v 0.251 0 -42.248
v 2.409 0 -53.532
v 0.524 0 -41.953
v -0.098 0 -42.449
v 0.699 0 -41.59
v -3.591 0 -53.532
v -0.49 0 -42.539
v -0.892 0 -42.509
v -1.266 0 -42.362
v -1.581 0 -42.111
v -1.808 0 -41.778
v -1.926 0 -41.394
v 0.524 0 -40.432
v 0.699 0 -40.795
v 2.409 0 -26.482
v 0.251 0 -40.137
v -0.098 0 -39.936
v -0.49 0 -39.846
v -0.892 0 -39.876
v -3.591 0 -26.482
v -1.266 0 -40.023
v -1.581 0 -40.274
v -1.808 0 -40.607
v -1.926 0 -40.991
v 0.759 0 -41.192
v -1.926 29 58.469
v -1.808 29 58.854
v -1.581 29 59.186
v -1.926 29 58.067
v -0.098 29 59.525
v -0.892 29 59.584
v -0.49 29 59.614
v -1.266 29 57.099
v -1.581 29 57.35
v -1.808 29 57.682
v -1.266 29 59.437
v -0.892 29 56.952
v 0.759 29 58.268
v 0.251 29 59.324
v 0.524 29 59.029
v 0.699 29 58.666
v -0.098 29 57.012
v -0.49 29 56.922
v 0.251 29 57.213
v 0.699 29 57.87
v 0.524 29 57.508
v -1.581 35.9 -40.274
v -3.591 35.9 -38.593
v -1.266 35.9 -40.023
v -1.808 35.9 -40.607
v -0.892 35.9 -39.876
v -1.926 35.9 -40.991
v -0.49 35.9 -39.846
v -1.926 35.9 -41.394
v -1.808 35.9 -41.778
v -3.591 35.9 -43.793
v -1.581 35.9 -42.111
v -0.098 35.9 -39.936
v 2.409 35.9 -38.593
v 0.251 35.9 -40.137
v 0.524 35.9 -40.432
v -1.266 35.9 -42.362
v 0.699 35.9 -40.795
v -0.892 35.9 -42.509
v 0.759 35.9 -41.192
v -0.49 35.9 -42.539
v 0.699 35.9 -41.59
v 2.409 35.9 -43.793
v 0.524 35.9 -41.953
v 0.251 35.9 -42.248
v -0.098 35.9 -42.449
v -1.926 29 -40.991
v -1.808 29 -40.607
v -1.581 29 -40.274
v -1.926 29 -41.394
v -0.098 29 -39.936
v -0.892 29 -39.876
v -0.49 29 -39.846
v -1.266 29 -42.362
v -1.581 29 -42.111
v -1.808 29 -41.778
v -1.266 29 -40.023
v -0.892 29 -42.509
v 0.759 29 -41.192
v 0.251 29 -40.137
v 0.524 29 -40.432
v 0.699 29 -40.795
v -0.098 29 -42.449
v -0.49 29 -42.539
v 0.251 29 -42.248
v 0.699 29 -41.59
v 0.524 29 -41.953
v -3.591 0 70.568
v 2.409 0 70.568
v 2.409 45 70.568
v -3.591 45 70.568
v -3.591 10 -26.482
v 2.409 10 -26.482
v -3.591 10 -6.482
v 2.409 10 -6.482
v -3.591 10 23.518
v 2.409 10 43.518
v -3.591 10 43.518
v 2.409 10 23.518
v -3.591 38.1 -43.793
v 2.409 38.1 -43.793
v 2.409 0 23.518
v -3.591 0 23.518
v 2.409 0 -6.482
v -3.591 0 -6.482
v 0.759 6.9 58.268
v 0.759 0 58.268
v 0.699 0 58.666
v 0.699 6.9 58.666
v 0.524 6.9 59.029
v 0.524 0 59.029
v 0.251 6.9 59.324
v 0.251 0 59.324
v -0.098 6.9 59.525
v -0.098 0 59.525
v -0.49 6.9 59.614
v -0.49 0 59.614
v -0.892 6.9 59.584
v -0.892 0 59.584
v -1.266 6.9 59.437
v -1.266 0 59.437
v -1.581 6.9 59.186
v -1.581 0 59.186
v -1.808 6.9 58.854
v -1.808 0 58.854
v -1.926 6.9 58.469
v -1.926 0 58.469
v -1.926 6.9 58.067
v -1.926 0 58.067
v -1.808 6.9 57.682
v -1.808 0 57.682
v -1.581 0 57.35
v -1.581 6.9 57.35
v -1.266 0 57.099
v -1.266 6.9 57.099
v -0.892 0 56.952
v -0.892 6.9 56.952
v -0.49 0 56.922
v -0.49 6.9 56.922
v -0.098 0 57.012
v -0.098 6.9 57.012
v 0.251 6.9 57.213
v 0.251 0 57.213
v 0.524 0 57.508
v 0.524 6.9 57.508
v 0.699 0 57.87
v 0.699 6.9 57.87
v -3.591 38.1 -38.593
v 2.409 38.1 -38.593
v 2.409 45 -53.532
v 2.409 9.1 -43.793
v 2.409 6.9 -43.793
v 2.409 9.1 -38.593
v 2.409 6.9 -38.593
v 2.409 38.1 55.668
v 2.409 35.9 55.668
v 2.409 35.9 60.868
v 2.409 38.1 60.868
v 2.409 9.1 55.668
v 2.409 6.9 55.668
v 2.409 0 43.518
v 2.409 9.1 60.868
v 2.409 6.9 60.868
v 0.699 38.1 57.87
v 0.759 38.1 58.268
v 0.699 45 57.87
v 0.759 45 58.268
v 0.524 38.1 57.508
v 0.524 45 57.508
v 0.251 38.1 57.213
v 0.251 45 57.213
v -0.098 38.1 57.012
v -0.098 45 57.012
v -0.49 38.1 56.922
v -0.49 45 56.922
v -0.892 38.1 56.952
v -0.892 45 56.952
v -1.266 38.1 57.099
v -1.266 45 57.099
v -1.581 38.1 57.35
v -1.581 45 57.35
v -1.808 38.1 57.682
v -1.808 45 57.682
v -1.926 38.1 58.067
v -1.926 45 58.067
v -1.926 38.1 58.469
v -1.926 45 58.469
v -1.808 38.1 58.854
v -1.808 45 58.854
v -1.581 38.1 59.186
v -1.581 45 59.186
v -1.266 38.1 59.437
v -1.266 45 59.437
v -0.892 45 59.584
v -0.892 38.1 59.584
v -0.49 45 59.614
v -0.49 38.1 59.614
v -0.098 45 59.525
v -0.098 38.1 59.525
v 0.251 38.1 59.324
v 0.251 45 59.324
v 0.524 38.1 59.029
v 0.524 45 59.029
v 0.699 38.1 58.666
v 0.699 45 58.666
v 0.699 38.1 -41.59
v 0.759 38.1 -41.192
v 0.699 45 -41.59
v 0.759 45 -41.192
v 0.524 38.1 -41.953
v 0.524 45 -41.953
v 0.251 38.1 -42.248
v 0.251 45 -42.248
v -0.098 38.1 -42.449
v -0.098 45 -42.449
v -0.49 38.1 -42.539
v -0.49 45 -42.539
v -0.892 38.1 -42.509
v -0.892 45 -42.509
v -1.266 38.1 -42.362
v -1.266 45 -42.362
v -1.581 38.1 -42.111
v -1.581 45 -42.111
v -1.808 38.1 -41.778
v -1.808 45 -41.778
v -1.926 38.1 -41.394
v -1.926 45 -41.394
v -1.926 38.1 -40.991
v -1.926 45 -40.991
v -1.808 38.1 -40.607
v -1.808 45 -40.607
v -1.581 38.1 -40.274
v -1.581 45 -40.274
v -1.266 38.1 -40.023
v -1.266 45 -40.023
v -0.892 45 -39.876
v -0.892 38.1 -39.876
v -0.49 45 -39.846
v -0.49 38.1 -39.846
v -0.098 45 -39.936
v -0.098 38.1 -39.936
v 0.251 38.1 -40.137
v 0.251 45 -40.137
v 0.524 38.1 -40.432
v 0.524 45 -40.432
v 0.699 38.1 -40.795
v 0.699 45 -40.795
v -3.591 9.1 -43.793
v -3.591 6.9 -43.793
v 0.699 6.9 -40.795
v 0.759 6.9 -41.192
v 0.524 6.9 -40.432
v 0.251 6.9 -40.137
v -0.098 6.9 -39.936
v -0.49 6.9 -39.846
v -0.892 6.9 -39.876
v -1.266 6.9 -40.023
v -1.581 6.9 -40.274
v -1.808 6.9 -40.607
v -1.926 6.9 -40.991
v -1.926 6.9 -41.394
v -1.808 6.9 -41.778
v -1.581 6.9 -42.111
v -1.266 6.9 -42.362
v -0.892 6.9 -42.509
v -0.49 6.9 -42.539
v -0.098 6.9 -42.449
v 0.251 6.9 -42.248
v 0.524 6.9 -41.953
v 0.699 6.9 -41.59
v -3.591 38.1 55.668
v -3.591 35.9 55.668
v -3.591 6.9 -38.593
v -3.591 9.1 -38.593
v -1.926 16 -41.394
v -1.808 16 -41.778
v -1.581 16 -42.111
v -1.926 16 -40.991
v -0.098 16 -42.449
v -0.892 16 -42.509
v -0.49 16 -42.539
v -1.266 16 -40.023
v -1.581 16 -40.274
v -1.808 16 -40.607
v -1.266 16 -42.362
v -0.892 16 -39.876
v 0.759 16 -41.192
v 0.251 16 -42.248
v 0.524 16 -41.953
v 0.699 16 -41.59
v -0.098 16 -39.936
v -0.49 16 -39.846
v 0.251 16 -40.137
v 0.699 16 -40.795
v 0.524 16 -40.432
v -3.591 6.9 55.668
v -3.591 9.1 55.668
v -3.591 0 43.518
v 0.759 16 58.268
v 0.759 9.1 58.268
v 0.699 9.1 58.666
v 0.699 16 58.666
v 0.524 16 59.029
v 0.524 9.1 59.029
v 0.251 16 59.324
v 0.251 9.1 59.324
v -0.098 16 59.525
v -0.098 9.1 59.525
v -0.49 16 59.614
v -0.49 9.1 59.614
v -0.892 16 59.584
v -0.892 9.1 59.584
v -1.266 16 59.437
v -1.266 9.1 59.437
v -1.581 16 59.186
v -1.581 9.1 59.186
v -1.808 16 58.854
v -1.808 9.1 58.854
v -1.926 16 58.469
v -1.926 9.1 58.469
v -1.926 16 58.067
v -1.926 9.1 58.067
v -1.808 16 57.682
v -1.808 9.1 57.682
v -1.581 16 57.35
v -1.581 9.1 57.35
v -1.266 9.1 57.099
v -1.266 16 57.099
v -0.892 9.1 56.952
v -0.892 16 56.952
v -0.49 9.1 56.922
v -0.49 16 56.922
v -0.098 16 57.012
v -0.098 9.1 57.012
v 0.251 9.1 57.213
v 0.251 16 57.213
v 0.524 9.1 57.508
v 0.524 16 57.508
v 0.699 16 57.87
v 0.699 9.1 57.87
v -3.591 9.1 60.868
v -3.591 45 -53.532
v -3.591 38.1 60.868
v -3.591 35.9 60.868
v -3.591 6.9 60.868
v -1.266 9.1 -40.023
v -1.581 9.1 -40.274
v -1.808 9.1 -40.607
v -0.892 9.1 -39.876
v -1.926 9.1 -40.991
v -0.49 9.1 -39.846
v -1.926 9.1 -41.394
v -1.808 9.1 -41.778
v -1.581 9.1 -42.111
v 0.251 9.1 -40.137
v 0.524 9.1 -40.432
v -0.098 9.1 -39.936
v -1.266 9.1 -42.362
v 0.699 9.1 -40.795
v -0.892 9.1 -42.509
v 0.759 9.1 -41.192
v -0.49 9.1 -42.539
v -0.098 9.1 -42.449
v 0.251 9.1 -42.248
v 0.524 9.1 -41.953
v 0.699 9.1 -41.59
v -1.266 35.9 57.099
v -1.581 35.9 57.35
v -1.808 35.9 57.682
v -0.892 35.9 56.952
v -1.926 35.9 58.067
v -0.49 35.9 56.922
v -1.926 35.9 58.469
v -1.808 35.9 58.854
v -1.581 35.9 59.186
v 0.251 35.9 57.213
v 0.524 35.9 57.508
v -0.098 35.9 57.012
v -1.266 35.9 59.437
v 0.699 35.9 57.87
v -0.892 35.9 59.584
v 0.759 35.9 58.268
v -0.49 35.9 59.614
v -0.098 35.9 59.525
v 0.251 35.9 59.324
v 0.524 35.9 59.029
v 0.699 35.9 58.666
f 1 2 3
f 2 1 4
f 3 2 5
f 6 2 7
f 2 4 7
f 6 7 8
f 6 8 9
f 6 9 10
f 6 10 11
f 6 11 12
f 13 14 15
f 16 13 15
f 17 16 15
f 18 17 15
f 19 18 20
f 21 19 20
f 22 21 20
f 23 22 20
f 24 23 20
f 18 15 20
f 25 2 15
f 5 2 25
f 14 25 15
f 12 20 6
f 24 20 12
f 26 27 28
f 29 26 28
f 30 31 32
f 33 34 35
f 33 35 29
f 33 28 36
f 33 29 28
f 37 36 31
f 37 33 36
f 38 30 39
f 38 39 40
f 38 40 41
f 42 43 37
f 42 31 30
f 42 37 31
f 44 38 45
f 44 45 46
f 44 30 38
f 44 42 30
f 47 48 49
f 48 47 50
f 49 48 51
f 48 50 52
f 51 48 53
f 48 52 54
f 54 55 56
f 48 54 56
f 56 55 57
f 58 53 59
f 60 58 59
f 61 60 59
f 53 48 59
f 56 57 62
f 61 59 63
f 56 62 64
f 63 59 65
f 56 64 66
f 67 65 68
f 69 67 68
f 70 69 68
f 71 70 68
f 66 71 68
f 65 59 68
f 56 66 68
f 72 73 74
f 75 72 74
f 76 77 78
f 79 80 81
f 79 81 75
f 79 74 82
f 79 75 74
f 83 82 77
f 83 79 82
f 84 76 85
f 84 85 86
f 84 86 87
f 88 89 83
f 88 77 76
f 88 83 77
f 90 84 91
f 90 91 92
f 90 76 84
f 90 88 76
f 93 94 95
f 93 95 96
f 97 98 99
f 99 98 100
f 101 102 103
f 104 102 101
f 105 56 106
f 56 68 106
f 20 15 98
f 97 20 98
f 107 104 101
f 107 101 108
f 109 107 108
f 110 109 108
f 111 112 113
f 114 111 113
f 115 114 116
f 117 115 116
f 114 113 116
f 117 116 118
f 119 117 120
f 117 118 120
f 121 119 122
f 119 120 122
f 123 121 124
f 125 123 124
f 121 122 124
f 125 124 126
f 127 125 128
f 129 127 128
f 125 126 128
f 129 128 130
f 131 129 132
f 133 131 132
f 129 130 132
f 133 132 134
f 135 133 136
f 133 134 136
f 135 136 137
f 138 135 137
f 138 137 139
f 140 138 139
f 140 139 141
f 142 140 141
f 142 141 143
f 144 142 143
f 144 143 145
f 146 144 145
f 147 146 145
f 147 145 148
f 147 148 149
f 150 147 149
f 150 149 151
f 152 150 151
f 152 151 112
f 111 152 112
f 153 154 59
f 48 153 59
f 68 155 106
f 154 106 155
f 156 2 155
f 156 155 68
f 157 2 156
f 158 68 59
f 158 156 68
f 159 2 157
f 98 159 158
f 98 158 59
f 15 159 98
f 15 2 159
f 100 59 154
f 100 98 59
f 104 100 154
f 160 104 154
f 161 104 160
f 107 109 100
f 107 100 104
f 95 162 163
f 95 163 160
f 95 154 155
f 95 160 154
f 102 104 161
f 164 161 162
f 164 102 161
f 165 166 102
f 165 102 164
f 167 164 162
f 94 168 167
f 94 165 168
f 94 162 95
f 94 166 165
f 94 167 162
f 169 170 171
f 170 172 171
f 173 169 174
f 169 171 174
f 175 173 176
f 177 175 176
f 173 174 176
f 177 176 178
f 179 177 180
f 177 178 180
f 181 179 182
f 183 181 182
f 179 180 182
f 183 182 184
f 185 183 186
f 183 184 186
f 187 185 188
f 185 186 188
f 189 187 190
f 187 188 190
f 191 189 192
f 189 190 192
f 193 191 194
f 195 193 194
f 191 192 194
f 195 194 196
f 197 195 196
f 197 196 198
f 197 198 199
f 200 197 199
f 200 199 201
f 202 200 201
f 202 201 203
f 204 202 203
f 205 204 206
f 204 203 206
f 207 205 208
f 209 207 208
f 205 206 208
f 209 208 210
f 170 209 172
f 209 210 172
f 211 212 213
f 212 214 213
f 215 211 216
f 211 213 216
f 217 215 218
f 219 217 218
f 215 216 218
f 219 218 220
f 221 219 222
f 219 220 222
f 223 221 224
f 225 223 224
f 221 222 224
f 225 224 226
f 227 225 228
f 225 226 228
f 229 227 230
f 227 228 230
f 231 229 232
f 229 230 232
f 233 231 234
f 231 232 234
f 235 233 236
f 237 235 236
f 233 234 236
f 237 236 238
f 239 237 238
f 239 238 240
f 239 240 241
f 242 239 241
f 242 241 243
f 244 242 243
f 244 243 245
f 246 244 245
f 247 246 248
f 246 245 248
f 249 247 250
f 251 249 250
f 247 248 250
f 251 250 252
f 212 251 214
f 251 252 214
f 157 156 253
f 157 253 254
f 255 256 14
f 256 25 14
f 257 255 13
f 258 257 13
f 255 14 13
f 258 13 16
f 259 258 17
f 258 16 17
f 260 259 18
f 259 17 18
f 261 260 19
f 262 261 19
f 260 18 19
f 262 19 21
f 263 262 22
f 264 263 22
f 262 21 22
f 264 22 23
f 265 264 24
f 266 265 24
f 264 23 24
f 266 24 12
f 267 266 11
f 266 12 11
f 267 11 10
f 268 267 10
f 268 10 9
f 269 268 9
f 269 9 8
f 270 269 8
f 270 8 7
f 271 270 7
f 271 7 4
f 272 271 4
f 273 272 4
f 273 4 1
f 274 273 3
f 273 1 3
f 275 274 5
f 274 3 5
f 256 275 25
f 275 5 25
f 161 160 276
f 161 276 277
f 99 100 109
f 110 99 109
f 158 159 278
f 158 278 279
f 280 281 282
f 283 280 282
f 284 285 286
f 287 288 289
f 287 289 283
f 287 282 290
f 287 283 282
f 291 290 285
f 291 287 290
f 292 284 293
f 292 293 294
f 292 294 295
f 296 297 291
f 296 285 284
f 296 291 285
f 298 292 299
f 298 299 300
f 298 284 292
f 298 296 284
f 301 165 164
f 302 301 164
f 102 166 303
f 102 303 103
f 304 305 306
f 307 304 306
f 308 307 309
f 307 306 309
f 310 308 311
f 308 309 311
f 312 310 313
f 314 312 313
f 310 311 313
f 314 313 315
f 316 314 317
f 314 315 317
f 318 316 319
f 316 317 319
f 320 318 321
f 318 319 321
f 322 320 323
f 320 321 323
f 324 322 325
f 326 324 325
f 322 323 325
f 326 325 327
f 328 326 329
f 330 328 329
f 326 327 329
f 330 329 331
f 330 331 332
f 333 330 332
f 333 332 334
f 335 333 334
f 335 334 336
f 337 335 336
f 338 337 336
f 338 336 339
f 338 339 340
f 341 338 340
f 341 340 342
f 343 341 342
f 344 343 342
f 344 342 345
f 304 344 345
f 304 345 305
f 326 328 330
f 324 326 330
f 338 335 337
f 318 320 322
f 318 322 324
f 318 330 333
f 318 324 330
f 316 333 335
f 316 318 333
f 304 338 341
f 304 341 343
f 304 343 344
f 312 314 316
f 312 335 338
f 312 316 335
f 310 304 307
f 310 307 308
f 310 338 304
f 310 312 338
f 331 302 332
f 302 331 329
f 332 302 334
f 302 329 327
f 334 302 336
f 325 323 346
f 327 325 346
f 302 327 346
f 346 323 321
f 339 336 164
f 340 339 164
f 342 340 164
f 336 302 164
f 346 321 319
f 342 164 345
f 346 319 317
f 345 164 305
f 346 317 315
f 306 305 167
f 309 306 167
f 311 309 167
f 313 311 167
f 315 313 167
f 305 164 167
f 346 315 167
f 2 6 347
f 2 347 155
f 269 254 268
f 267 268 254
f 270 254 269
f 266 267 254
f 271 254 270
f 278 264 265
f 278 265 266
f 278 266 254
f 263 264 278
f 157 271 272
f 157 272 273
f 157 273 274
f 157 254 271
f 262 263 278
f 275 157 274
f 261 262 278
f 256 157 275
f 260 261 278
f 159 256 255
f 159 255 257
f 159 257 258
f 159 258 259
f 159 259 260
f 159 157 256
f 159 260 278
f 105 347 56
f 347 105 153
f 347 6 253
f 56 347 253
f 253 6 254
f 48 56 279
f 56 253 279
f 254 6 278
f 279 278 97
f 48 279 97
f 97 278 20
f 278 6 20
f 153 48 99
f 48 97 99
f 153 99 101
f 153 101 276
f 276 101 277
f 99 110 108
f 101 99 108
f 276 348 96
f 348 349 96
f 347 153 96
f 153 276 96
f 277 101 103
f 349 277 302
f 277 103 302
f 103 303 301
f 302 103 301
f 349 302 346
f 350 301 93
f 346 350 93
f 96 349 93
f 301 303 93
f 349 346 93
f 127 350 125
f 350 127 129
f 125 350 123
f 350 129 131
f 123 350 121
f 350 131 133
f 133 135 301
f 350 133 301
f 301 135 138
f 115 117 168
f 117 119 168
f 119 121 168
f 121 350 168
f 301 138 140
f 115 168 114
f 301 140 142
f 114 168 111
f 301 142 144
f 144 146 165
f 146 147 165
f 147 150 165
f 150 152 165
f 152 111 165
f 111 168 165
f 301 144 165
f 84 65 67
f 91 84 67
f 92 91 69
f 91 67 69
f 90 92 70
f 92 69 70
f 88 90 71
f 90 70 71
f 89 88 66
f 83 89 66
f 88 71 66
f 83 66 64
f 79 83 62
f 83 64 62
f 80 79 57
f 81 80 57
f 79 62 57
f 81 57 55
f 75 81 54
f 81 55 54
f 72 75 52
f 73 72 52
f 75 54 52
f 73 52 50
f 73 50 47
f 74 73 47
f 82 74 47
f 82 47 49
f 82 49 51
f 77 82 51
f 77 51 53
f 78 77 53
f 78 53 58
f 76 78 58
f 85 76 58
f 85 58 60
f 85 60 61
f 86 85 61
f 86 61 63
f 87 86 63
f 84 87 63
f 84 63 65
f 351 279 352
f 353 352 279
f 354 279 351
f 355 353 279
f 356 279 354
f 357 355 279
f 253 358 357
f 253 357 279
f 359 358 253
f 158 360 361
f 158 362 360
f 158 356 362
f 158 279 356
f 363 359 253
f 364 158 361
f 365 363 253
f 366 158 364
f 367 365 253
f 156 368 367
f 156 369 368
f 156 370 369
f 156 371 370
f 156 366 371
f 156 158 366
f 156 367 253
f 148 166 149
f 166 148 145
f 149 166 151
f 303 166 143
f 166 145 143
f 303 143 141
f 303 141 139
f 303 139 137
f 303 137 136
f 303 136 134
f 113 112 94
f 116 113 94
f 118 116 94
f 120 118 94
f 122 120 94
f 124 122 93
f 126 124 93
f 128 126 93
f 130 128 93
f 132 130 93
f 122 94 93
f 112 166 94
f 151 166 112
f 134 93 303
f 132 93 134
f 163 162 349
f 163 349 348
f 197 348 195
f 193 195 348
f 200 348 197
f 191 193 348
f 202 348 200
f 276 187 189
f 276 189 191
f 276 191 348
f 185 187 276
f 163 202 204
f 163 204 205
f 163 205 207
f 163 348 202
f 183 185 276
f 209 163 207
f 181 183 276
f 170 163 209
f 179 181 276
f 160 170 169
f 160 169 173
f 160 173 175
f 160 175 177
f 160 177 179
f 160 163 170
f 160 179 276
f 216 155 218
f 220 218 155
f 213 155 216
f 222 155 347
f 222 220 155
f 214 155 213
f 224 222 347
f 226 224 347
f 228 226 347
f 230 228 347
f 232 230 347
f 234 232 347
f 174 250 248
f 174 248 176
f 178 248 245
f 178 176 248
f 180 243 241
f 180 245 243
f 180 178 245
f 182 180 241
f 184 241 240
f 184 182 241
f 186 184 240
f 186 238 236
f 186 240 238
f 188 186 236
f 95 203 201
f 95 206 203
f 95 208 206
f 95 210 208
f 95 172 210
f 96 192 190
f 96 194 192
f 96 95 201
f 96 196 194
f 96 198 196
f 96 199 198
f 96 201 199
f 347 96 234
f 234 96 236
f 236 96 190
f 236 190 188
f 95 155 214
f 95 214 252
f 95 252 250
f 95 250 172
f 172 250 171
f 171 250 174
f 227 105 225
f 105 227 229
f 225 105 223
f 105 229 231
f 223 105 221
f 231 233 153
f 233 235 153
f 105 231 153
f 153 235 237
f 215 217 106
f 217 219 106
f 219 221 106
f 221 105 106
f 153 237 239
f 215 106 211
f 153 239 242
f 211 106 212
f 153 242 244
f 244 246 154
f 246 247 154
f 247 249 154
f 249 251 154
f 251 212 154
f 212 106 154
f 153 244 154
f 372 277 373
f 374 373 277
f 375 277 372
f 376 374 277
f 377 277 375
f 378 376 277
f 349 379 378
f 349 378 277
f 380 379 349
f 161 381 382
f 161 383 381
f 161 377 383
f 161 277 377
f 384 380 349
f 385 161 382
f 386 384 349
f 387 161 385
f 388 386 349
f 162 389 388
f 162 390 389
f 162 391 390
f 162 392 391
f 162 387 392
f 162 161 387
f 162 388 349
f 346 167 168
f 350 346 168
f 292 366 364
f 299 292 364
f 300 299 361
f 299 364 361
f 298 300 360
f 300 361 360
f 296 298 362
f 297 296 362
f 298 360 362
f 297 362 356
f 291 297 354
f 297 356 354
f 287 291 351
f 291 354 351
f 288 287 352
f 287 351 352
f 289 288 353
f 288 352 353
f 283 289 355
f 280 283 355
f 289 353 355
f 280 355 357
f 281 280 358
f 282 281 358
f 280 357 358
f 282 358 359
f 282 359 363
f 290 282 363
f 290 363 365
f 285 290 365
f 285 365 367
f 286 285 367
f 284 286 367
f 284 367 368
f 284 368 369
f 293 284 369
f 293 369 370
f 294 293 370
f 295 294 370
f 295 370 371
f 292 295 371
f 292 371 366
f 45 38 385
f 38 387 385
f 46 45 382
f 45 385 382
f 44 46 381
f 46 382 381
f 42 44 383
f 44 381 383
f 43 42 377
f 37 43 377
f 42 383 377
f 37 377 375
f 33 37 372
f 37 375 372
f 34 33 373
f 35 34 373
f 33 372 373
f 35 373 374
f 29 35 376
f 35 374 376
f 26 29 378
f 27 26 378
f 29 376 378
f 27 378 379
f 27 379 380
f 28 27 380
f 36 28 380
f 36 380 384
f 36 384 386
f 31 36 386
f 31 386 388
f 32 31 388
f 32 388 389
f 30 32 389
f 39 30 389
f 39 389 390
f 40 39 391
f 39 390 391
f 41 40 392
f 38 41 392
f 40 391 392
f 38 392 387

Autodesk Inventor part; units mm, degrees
ref_plane "YZ Plane" through (0, 0, 0) normal (1, 0, 0) x (0, 1, 0)
ref_plane "XZ Plane" through (0, 0, 0) normal (0, 1, 0) x (-1, 0, 0)
ref_plane "XY Plane" through (0, 0, 0) normal (0, 0, 1) x (1, 0, 0)
sketch "스케치1" plane through (0, 0, 0) normal (0, 1, 0) x (-1, 0, 0)
  line L0 (3.5912, -53.5318) -> (3.5912, 70.5682)
  line L1 (3.5912, -53.5318) -> (-2.4088, -53.5318)
  line L2 (-2.4088, -53.5318) -> (-2.4088, 70.5682)
  line L3 (-2.4088, 70.5682) -> (3.5912, 70.5682)
  line L4 (3.5912, 70.5682) -> (3.5912, -53.5318)
  point P0 (0, 0)
  dimension "d0" = 6
extrude "돌출1" add sketch "스케치1" along normal blind 45
sketch "스케치2" plane through (0, 45, 0) normal (0, 1, 0) x (1, 0, 0)
  line L0 (2.4088, -70.5682) -> (2.4088, 53.5318)
  line L1 (2.4088, -70.5682) -> (-3.5912, -70.5682)
  line L2 (-3.5912, -70.5682) -> (-3.5912, 53.5318)
  line L3 (-3.5912, 53.5318) -> (2.4088, 53.5318)
  line L4 (2.4088, 53.5318) -> (2.4088, -70.5682)
  circle A0 centre (-0.5912, -58.2682) radius 1.35
  circle A1 centre (-0.5912, 41.1925) radius 1.35
  line L5 (2.4088, -70.5682) -> (2.4088, 53.5318) projected
  line L6 (2.4088, 53.5318) -> (-3.5912, 53.5318) projected
  line L7 (-3.5912, 53.5318) -> (-3.5912, -70.5682) projected
  line L8 (-3.5912, -70.5682) -> (2.4088, -70.5682) projected
  point P0 (0, 0)
  dimension "d3" = 6
  dimension "d4" = 2.7
  dimension "d5" = 2.7
extrude "돌출2" cut sketch "스케치2" against normal blind 16 contours A0 | A1
sketch "스케치3" plane through (2.4088, 0, 70.5682) normal (1, 0, 0) x (0, 0, -1)
  line L0 (0, 0) -> (124.1, 0) projected
  line L1 (124.1, 0) -> (124.1, 45) projected
  line L2 (0, 45) -> (124.1, 45) projected
  line L3 (0, 0) -> (0, 45) projected
  line L4 (62.05, 0) -> (77.05, 0)
  line L5 (77.05, 0) -> (47.05, 0)
  line L6 (77.05, 0) -> (97.05, 0)
  line L7 (97.05, 0) -> (97.05, 10)
  line L8 (97.05, 10) -> (77.05, 10)
  line L9 (77.05, 10) -> (77.05, 0)
  line L10 (47.05, 0) -> (27.05, 0)
  line L11 (27.05, 0) -> (27.05, 10)
  line L12 (27.05, 10) -> (47.05, 10)
  line L13 (47.05, 10) -> (47.05, 0)
  point P0 (70.5682, 0)
  dimension "d8" = 15
  dimension "d9" = 30
  dimension "d10" = 20
  dimension "d11" = 10
  dimension "d12" = 20
  dimension "d13" = 10
extrude "돌출3" cut sketch "스케치3" against normal blind 16 contours L11 L12 L13 L0 | L9 L8 L7 L0
sketch "스케치4" plane through (0, 0, 0) normal (0, -1, 0) x (1, 0, 0)
  circle A0 centre (-0.5912, 58.2682) radius 1.35 projected
  circle A1 centre (-0.5912, -41.1925) radius 1.35 projected
  point P0 (0, 0)
extrude "돌출4" cut sketch "스케치4" against normal blind 16
sketch "스케치5" plane through (2.4088, 0, -53.5318) normal (1, 0, 0) x (0, 0, -1)
  line L0 (-97.05, 0) -> (-124.1, 0) projected
  line L1 (-124.1, 0) -> (-97.05, 0) projected
  line L2 (-27.05, 0) -> (0, 0) projected
  line L3 (0, 45) -> (-124.1, 45) projected
  line L4 (-124.1, 45) -> (0, 45) projected
  line L5 (-113.15, 45) -> (-110.45, 45) projected
  line L6 (-13.6892, 45) -> (-10.9892, 45) projected
  line L7 (-124.1, 45) -> (0, 45) projected
  line L8 (0, 45) -> (-124.1, 45) projected
  line L9 (-47.05, 10) -> (-47.05, 0) projected
  line L10 (-47.05, 0) -> (-77.05, 0) projected
  line L11 (-77.05, 0) -> (-77.05, 10) projected
  line L12 (-77.05, 10) -> (-97.05, 10) projected
  line L13 (-97.05, 10) -> (-97.05, 0) projected
  line L14 (-97.05, 0) -> (-124.1, 0) projected
  line L15 (-124.1, 0) -> (-124.1, 45) projected
  line L16 (0, 45) -> (-124.1, 45) projected
  line L17 (0, 0) -> (0, 45) projected
  line L18 (0, 0) -> (-27.05, 0) projected
  line L19 (-27.05, 0) -> (-27.05, 10) projected
  line L20 (-27.05, 10) -> (-47.05, 10) projected
  line L21 (-47.05, 0) -> (-47.05, 10) projected
  line L22 (-47.05, 10) -> (-27.05, 10) projected
  line L23 (-27.05, 10) -> (-27.05, 0) projected
  line L24 (-27.05, 0) -> (0, 0) projected
  line L25 (0, 0) -> (0, 45) projected
  line L26 (-124.1, 45) -> (0, 45) projected
  line L27 (-124.1, 0) -> (-124.1, 45) projected
  line L28 (-124.1, 0) -> (-97.05, 0) projected
  line L29 (-97.05, 0) -> (-97.05, 10) projected
  line L30 (-97.05, 10) -> (-77.05, 10) projected
  line L31 (-77.05, 10) -> (-77.05, 0) projected
  line L32 (-77.05, 0) -> (-47.05, 0) projected
  line L33 (-97.05, 10) -> (-77.05, 10) projected
  line L34 (-77.05, 10) -> (-97.05, 10) projected
  line L35 (-77.05, 10) -> (-97.05, 10) projected
  line L36 (-97.05, 10) -> (-77.05, 10) projected
  line L37 (-97.05, 10) -> (-97.05, 0) projected
  line L38 (-97.05, 10) -> (-97.05, 0) projected
  line L39 (-97.05, 0) -> (-97.05, 10) projected
  line L40 (-97.05, 0) -> (-97.05, 10) projected
  line L41 (-110.45, 16) -> (-113.15, 16) projected
  line L42 (-110.45, 16) -> (-113.15, 16) projected
  line L43 (-110.45, 0) -> (-113.15, 0) projected
  line L44 (-110.45, 16) -> (-113.15, 16) projected
  line L45 (-110.45, 0) -> (-113.15, 0) projected
  line L46 (-113.15, 29) -> (-110.45, 29) projected
  line L47 (-113.15, 29) -> (-110.45, 29) projected
  line L48 (-113.15, 29) -> (-110.45, 29) projected
  line L49 (-113.15, 45) -> (-110.45, 45) projected
  line L50 (-110.45, 0) -> (-113.15, 0) projected
  line L51 (-124.1, 0) -> (-97.05, 0) projected
  line L52 (-97.05, 0) -> (-124.1, 0) projected
  line L53 (-124.1, 0) -> (-124.1, 45) projected
  line L54 (-124.1, 0) -> (-124.1, 45) projected
  line L55 (-124.1, 0) -> (-124.1, 45) projected
  line L56 (-124.1, 0) -> (-124.1, 45) projected
  line L57 (-10.9892, 16) -> (-13.6892, 16) projected
  line L58 (-10.9892, 16) -> (-13.6892, 16) projected
  line L59 (-10.9892, 0) -> (-13.6892, 0) projected
  line L60 (-10.9892, 16) -> (-13.6892, 16) projected
  line L61 (-10.9892, 0) -> (-13.6892, 0) projected
  line L62 (0, 0) -> (0, 45) projected
  line L63 (-10.9892, 0) -> (-13.6892, 0) projected
  line L64 (0, 0) -> (-27.05, 0) projected
  line L65 (-27.05, 0) -> (0, 0) projected
  line L66 (0, 0) -> (-27.05, 0) projected
  line L67 (-113.15, 45) -> (-110.45, 45) projected
  line L68 (0, 0) -> (0, 45) projected
  line L69 (-47.05, 0) -> (-47.05, 10) projected
  line L70 (-47.05, 10) -> (-47.05, 0) projected
  line L71 (-47.05, 10) -> (-47.05, 0) projected
  line L72 (-47.05, 0) -> (-47.05, 10) projected
  line L73 (-47.05, 10) -> (-27.05, 10) projected
  line L74 (-27.05, 10) -> (-47.05, 10) projected
  line L75 (-47.05, 10) -> (-27.05, 10) projected
  line L76 (-27.05, 0) -> (-27.05, 10) projected
  line L77 (-27.05, 10) -> (-27.05, 0) projected
  line L78 (-27.05, 0) -> (-27.05, 10) projected
  line L79 (-27.05, 10) -> (-27.05, 0) projected
  line L80 (-13.6892, 45) -> (-10.9892, 45) projected
  line L81 (-13.6892, 29) -> (-10.9892, 29) projected
  line L82 (-13.6892, 29) -> (-10.9892, 29) projected
  line L83 (-13.6892, 45) -> (-10.9892, 45) projected
  line L84 (0, 0) -> (0, 45) projected
  line L85 (0, 0) -> (0, 45) projected
  line L86 (-13.6892, 29) -> (-10.9892, 29) projected
  line L87 (-77.05, 10) -> (-77.05, 0) projected
  line L88 (-77.05, 0) -> (-77.05, 10) projected
  line L89 (-77.05, 10) -> (-77.05, 0) projected
  line L90 (-77.05, 0) -> (-47.05, 0) projected
  line L91 (-77.05, 0) -> (-47.05, 0) projected
  line L92 (-47.05, 0) -> (-77.05, 0) projected
  line L93 (-47.05, 0) -> (-77.05, 0) projected
  line L94 (-77.05, 0) -> (-77.05, 10) projected
  line L95 (-27.05, 10) -> (-47.05, 10) projected
  line L96 (-13.6892, 0) -> (-13.6892, 16) projected
  line L97 (-10.9892, 0) -> (-10.9892, 16) projected
  line L98 (-13.6892, 45) -> (-13.6892, 29) projected
  line L99 (-10.9892, 45) -> (-10.9892, 29) projected
  line L100 (-110.45, 45) -> (-110.45, 29) projected
  line L101 (-113.15, 45) -> (-113.15, 29) projected
  line L102 (-113.15, 0) -> (-113.15, 16) projected
  line L103 (-110.45, 0) -> (-110.45, 16) projected
  line L104 (-9.7392, 6.9) -> (-14.9392, 6.9)
  line L105 (-14.9392, 6.9) -> (-14.9392, 9.1)
  line L106 (-14.9392, 9.1) -> (-9.7392, 9.1)
  line L107 (-9.7392, 9.1) -> (-9.7392, 6.9)
  line L108 (-9.7392, 6.9) -> (-14.9392, 9.1) construction
  line L109 (-14.9392, 6.9) -> (-9.7392, 9.1) construction
  line L110 (-109.2, 9.1) -> (-114.4, 9.1)
  line L111 (-114.4, 9.1) -> (-114.4, 6.9)
  line L112 (-114.4, 6.9) -> (-109.2, 6.9)
  line L113 (-109.2, 6.9) -> (-109.2, 9.1)
  line L114 (-109.2, 9.1) -> (-114.4, 6.9) construction
  line L115 (-114.4, 9.1) -> (-109.2, 6.9) construction
  line L116 (-9.7392, 38.1) -> (-14.9392, 38.1)
  line L117 (-14.9392, 38.1) -> (-14.9392, 35.9)
  line L118 (-14.9392, 35.9) -> (-9.7392, 35.9)
  line L119 (-9.7392, 35.9) -> (-9.7392, 38.1)
  line L120 (-9.7392, 38.1) -> (-14.9392, 35.9) construction
  line L121 (-14.9392, 38.1) -> (-9.7392, 35.9) construction
  line L122 (-109.2, 35.9) -> (-114.4, 35.9)
  line L123 (-114.4, 35.9) -> (-114.4, 38.1)
  line L124 (-114.4, 38.1) -> (-109.2, 38.1)
  line L125 (-109.2, 38.1) -> (-109.2, 35.9)
  line L126 (-109.2, 35.9) -> (-114.4, 38.1) construction
  line L127 (-114.4, 35.9) -> (-109.2, 38.1) construction
  point P0 (-53.5318, 0)
  point P1 (-12.3392, 8)
  point P2 (-111.8, 8)
  point P3 (-12.3392, 37)
  point P4 (-111.8, 37)
  dimension "d18" = 5.2
  dimension "d19" = 2.2
  dimension "d20" = 5.2
  dimension "d21" = 2.2
  dimension "d22" = 5.2
  dimension "d23" = 2.2
extrude "돌출5" cut sketch "스케치5" against normal blind 16 contours L112 L102 L110 L103 | L103 L110 L113 L112 | L112 L111 L110 L102 | L124 L100 L122 L101 | L101 L122 L123 L124 | L124 L125 L122 L100 | L116 L99 L118 L98 | L98 L118 L117 L116 | L116 L119 L118 L99 | L104 L105 L106 L96 | L96 L106 L97 L104 | L97 L106 L107 L104
properties part number "frame_head3" material "PMMA 플라스틱"
